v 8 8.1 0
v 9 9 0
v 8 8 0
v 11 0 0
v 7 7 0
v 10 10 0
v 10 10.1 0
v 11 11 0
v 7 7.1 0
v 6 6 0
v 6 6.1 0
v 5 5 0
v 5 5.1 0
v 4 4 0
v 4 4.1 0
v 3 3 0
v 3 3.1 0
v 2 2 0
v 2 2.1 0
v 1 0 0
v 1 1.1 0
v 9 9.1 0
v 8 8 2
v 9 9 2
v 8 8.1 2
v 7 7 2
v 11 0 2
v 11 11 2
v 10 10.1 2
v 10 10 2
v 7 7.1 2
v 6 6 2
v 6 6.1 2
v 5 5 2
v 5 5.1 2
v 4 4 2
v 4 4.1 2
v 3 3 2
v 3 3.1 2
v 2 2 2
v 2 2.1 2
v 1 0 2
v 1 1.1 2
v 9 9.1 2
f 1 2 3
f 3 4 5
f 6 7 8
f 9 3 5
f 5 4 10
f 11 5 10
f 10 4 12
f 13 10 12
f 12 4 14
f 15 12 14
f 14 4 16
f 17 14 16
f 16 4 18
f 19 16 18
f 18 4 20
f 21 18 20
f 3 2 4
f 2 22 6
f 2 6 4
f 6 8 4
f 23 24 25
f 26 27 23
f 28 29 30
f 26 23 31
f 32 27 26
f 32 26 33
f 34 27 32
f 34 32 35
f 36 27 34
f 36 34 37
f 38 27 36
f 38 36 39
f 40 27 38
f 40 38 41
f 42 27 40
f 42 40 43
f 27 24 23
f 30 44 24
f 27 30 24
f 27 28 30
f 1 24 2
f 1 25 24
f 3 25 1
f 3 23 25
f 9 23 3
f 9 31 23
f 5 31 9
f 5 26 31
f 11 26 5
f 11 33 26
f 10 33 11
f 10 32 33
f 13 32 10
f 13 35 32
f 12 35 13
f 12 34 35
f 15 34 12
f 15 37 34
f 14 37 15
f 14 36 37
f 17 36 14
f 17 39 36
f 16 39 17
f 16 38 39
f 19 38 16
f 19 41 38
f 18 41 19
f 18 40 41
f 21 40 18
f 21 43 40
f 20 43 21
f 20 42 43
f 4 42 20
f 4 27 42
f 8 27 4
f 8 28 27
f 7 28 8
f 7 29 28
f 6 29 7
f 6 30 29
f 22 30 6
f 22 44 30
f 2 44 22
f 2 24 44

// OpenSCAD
linear_extrude(2) for(x=[1:10]) {
    polygon([[x,0],[x+1,0],[x+1,x+1],[x,x+0.1]]);
}
